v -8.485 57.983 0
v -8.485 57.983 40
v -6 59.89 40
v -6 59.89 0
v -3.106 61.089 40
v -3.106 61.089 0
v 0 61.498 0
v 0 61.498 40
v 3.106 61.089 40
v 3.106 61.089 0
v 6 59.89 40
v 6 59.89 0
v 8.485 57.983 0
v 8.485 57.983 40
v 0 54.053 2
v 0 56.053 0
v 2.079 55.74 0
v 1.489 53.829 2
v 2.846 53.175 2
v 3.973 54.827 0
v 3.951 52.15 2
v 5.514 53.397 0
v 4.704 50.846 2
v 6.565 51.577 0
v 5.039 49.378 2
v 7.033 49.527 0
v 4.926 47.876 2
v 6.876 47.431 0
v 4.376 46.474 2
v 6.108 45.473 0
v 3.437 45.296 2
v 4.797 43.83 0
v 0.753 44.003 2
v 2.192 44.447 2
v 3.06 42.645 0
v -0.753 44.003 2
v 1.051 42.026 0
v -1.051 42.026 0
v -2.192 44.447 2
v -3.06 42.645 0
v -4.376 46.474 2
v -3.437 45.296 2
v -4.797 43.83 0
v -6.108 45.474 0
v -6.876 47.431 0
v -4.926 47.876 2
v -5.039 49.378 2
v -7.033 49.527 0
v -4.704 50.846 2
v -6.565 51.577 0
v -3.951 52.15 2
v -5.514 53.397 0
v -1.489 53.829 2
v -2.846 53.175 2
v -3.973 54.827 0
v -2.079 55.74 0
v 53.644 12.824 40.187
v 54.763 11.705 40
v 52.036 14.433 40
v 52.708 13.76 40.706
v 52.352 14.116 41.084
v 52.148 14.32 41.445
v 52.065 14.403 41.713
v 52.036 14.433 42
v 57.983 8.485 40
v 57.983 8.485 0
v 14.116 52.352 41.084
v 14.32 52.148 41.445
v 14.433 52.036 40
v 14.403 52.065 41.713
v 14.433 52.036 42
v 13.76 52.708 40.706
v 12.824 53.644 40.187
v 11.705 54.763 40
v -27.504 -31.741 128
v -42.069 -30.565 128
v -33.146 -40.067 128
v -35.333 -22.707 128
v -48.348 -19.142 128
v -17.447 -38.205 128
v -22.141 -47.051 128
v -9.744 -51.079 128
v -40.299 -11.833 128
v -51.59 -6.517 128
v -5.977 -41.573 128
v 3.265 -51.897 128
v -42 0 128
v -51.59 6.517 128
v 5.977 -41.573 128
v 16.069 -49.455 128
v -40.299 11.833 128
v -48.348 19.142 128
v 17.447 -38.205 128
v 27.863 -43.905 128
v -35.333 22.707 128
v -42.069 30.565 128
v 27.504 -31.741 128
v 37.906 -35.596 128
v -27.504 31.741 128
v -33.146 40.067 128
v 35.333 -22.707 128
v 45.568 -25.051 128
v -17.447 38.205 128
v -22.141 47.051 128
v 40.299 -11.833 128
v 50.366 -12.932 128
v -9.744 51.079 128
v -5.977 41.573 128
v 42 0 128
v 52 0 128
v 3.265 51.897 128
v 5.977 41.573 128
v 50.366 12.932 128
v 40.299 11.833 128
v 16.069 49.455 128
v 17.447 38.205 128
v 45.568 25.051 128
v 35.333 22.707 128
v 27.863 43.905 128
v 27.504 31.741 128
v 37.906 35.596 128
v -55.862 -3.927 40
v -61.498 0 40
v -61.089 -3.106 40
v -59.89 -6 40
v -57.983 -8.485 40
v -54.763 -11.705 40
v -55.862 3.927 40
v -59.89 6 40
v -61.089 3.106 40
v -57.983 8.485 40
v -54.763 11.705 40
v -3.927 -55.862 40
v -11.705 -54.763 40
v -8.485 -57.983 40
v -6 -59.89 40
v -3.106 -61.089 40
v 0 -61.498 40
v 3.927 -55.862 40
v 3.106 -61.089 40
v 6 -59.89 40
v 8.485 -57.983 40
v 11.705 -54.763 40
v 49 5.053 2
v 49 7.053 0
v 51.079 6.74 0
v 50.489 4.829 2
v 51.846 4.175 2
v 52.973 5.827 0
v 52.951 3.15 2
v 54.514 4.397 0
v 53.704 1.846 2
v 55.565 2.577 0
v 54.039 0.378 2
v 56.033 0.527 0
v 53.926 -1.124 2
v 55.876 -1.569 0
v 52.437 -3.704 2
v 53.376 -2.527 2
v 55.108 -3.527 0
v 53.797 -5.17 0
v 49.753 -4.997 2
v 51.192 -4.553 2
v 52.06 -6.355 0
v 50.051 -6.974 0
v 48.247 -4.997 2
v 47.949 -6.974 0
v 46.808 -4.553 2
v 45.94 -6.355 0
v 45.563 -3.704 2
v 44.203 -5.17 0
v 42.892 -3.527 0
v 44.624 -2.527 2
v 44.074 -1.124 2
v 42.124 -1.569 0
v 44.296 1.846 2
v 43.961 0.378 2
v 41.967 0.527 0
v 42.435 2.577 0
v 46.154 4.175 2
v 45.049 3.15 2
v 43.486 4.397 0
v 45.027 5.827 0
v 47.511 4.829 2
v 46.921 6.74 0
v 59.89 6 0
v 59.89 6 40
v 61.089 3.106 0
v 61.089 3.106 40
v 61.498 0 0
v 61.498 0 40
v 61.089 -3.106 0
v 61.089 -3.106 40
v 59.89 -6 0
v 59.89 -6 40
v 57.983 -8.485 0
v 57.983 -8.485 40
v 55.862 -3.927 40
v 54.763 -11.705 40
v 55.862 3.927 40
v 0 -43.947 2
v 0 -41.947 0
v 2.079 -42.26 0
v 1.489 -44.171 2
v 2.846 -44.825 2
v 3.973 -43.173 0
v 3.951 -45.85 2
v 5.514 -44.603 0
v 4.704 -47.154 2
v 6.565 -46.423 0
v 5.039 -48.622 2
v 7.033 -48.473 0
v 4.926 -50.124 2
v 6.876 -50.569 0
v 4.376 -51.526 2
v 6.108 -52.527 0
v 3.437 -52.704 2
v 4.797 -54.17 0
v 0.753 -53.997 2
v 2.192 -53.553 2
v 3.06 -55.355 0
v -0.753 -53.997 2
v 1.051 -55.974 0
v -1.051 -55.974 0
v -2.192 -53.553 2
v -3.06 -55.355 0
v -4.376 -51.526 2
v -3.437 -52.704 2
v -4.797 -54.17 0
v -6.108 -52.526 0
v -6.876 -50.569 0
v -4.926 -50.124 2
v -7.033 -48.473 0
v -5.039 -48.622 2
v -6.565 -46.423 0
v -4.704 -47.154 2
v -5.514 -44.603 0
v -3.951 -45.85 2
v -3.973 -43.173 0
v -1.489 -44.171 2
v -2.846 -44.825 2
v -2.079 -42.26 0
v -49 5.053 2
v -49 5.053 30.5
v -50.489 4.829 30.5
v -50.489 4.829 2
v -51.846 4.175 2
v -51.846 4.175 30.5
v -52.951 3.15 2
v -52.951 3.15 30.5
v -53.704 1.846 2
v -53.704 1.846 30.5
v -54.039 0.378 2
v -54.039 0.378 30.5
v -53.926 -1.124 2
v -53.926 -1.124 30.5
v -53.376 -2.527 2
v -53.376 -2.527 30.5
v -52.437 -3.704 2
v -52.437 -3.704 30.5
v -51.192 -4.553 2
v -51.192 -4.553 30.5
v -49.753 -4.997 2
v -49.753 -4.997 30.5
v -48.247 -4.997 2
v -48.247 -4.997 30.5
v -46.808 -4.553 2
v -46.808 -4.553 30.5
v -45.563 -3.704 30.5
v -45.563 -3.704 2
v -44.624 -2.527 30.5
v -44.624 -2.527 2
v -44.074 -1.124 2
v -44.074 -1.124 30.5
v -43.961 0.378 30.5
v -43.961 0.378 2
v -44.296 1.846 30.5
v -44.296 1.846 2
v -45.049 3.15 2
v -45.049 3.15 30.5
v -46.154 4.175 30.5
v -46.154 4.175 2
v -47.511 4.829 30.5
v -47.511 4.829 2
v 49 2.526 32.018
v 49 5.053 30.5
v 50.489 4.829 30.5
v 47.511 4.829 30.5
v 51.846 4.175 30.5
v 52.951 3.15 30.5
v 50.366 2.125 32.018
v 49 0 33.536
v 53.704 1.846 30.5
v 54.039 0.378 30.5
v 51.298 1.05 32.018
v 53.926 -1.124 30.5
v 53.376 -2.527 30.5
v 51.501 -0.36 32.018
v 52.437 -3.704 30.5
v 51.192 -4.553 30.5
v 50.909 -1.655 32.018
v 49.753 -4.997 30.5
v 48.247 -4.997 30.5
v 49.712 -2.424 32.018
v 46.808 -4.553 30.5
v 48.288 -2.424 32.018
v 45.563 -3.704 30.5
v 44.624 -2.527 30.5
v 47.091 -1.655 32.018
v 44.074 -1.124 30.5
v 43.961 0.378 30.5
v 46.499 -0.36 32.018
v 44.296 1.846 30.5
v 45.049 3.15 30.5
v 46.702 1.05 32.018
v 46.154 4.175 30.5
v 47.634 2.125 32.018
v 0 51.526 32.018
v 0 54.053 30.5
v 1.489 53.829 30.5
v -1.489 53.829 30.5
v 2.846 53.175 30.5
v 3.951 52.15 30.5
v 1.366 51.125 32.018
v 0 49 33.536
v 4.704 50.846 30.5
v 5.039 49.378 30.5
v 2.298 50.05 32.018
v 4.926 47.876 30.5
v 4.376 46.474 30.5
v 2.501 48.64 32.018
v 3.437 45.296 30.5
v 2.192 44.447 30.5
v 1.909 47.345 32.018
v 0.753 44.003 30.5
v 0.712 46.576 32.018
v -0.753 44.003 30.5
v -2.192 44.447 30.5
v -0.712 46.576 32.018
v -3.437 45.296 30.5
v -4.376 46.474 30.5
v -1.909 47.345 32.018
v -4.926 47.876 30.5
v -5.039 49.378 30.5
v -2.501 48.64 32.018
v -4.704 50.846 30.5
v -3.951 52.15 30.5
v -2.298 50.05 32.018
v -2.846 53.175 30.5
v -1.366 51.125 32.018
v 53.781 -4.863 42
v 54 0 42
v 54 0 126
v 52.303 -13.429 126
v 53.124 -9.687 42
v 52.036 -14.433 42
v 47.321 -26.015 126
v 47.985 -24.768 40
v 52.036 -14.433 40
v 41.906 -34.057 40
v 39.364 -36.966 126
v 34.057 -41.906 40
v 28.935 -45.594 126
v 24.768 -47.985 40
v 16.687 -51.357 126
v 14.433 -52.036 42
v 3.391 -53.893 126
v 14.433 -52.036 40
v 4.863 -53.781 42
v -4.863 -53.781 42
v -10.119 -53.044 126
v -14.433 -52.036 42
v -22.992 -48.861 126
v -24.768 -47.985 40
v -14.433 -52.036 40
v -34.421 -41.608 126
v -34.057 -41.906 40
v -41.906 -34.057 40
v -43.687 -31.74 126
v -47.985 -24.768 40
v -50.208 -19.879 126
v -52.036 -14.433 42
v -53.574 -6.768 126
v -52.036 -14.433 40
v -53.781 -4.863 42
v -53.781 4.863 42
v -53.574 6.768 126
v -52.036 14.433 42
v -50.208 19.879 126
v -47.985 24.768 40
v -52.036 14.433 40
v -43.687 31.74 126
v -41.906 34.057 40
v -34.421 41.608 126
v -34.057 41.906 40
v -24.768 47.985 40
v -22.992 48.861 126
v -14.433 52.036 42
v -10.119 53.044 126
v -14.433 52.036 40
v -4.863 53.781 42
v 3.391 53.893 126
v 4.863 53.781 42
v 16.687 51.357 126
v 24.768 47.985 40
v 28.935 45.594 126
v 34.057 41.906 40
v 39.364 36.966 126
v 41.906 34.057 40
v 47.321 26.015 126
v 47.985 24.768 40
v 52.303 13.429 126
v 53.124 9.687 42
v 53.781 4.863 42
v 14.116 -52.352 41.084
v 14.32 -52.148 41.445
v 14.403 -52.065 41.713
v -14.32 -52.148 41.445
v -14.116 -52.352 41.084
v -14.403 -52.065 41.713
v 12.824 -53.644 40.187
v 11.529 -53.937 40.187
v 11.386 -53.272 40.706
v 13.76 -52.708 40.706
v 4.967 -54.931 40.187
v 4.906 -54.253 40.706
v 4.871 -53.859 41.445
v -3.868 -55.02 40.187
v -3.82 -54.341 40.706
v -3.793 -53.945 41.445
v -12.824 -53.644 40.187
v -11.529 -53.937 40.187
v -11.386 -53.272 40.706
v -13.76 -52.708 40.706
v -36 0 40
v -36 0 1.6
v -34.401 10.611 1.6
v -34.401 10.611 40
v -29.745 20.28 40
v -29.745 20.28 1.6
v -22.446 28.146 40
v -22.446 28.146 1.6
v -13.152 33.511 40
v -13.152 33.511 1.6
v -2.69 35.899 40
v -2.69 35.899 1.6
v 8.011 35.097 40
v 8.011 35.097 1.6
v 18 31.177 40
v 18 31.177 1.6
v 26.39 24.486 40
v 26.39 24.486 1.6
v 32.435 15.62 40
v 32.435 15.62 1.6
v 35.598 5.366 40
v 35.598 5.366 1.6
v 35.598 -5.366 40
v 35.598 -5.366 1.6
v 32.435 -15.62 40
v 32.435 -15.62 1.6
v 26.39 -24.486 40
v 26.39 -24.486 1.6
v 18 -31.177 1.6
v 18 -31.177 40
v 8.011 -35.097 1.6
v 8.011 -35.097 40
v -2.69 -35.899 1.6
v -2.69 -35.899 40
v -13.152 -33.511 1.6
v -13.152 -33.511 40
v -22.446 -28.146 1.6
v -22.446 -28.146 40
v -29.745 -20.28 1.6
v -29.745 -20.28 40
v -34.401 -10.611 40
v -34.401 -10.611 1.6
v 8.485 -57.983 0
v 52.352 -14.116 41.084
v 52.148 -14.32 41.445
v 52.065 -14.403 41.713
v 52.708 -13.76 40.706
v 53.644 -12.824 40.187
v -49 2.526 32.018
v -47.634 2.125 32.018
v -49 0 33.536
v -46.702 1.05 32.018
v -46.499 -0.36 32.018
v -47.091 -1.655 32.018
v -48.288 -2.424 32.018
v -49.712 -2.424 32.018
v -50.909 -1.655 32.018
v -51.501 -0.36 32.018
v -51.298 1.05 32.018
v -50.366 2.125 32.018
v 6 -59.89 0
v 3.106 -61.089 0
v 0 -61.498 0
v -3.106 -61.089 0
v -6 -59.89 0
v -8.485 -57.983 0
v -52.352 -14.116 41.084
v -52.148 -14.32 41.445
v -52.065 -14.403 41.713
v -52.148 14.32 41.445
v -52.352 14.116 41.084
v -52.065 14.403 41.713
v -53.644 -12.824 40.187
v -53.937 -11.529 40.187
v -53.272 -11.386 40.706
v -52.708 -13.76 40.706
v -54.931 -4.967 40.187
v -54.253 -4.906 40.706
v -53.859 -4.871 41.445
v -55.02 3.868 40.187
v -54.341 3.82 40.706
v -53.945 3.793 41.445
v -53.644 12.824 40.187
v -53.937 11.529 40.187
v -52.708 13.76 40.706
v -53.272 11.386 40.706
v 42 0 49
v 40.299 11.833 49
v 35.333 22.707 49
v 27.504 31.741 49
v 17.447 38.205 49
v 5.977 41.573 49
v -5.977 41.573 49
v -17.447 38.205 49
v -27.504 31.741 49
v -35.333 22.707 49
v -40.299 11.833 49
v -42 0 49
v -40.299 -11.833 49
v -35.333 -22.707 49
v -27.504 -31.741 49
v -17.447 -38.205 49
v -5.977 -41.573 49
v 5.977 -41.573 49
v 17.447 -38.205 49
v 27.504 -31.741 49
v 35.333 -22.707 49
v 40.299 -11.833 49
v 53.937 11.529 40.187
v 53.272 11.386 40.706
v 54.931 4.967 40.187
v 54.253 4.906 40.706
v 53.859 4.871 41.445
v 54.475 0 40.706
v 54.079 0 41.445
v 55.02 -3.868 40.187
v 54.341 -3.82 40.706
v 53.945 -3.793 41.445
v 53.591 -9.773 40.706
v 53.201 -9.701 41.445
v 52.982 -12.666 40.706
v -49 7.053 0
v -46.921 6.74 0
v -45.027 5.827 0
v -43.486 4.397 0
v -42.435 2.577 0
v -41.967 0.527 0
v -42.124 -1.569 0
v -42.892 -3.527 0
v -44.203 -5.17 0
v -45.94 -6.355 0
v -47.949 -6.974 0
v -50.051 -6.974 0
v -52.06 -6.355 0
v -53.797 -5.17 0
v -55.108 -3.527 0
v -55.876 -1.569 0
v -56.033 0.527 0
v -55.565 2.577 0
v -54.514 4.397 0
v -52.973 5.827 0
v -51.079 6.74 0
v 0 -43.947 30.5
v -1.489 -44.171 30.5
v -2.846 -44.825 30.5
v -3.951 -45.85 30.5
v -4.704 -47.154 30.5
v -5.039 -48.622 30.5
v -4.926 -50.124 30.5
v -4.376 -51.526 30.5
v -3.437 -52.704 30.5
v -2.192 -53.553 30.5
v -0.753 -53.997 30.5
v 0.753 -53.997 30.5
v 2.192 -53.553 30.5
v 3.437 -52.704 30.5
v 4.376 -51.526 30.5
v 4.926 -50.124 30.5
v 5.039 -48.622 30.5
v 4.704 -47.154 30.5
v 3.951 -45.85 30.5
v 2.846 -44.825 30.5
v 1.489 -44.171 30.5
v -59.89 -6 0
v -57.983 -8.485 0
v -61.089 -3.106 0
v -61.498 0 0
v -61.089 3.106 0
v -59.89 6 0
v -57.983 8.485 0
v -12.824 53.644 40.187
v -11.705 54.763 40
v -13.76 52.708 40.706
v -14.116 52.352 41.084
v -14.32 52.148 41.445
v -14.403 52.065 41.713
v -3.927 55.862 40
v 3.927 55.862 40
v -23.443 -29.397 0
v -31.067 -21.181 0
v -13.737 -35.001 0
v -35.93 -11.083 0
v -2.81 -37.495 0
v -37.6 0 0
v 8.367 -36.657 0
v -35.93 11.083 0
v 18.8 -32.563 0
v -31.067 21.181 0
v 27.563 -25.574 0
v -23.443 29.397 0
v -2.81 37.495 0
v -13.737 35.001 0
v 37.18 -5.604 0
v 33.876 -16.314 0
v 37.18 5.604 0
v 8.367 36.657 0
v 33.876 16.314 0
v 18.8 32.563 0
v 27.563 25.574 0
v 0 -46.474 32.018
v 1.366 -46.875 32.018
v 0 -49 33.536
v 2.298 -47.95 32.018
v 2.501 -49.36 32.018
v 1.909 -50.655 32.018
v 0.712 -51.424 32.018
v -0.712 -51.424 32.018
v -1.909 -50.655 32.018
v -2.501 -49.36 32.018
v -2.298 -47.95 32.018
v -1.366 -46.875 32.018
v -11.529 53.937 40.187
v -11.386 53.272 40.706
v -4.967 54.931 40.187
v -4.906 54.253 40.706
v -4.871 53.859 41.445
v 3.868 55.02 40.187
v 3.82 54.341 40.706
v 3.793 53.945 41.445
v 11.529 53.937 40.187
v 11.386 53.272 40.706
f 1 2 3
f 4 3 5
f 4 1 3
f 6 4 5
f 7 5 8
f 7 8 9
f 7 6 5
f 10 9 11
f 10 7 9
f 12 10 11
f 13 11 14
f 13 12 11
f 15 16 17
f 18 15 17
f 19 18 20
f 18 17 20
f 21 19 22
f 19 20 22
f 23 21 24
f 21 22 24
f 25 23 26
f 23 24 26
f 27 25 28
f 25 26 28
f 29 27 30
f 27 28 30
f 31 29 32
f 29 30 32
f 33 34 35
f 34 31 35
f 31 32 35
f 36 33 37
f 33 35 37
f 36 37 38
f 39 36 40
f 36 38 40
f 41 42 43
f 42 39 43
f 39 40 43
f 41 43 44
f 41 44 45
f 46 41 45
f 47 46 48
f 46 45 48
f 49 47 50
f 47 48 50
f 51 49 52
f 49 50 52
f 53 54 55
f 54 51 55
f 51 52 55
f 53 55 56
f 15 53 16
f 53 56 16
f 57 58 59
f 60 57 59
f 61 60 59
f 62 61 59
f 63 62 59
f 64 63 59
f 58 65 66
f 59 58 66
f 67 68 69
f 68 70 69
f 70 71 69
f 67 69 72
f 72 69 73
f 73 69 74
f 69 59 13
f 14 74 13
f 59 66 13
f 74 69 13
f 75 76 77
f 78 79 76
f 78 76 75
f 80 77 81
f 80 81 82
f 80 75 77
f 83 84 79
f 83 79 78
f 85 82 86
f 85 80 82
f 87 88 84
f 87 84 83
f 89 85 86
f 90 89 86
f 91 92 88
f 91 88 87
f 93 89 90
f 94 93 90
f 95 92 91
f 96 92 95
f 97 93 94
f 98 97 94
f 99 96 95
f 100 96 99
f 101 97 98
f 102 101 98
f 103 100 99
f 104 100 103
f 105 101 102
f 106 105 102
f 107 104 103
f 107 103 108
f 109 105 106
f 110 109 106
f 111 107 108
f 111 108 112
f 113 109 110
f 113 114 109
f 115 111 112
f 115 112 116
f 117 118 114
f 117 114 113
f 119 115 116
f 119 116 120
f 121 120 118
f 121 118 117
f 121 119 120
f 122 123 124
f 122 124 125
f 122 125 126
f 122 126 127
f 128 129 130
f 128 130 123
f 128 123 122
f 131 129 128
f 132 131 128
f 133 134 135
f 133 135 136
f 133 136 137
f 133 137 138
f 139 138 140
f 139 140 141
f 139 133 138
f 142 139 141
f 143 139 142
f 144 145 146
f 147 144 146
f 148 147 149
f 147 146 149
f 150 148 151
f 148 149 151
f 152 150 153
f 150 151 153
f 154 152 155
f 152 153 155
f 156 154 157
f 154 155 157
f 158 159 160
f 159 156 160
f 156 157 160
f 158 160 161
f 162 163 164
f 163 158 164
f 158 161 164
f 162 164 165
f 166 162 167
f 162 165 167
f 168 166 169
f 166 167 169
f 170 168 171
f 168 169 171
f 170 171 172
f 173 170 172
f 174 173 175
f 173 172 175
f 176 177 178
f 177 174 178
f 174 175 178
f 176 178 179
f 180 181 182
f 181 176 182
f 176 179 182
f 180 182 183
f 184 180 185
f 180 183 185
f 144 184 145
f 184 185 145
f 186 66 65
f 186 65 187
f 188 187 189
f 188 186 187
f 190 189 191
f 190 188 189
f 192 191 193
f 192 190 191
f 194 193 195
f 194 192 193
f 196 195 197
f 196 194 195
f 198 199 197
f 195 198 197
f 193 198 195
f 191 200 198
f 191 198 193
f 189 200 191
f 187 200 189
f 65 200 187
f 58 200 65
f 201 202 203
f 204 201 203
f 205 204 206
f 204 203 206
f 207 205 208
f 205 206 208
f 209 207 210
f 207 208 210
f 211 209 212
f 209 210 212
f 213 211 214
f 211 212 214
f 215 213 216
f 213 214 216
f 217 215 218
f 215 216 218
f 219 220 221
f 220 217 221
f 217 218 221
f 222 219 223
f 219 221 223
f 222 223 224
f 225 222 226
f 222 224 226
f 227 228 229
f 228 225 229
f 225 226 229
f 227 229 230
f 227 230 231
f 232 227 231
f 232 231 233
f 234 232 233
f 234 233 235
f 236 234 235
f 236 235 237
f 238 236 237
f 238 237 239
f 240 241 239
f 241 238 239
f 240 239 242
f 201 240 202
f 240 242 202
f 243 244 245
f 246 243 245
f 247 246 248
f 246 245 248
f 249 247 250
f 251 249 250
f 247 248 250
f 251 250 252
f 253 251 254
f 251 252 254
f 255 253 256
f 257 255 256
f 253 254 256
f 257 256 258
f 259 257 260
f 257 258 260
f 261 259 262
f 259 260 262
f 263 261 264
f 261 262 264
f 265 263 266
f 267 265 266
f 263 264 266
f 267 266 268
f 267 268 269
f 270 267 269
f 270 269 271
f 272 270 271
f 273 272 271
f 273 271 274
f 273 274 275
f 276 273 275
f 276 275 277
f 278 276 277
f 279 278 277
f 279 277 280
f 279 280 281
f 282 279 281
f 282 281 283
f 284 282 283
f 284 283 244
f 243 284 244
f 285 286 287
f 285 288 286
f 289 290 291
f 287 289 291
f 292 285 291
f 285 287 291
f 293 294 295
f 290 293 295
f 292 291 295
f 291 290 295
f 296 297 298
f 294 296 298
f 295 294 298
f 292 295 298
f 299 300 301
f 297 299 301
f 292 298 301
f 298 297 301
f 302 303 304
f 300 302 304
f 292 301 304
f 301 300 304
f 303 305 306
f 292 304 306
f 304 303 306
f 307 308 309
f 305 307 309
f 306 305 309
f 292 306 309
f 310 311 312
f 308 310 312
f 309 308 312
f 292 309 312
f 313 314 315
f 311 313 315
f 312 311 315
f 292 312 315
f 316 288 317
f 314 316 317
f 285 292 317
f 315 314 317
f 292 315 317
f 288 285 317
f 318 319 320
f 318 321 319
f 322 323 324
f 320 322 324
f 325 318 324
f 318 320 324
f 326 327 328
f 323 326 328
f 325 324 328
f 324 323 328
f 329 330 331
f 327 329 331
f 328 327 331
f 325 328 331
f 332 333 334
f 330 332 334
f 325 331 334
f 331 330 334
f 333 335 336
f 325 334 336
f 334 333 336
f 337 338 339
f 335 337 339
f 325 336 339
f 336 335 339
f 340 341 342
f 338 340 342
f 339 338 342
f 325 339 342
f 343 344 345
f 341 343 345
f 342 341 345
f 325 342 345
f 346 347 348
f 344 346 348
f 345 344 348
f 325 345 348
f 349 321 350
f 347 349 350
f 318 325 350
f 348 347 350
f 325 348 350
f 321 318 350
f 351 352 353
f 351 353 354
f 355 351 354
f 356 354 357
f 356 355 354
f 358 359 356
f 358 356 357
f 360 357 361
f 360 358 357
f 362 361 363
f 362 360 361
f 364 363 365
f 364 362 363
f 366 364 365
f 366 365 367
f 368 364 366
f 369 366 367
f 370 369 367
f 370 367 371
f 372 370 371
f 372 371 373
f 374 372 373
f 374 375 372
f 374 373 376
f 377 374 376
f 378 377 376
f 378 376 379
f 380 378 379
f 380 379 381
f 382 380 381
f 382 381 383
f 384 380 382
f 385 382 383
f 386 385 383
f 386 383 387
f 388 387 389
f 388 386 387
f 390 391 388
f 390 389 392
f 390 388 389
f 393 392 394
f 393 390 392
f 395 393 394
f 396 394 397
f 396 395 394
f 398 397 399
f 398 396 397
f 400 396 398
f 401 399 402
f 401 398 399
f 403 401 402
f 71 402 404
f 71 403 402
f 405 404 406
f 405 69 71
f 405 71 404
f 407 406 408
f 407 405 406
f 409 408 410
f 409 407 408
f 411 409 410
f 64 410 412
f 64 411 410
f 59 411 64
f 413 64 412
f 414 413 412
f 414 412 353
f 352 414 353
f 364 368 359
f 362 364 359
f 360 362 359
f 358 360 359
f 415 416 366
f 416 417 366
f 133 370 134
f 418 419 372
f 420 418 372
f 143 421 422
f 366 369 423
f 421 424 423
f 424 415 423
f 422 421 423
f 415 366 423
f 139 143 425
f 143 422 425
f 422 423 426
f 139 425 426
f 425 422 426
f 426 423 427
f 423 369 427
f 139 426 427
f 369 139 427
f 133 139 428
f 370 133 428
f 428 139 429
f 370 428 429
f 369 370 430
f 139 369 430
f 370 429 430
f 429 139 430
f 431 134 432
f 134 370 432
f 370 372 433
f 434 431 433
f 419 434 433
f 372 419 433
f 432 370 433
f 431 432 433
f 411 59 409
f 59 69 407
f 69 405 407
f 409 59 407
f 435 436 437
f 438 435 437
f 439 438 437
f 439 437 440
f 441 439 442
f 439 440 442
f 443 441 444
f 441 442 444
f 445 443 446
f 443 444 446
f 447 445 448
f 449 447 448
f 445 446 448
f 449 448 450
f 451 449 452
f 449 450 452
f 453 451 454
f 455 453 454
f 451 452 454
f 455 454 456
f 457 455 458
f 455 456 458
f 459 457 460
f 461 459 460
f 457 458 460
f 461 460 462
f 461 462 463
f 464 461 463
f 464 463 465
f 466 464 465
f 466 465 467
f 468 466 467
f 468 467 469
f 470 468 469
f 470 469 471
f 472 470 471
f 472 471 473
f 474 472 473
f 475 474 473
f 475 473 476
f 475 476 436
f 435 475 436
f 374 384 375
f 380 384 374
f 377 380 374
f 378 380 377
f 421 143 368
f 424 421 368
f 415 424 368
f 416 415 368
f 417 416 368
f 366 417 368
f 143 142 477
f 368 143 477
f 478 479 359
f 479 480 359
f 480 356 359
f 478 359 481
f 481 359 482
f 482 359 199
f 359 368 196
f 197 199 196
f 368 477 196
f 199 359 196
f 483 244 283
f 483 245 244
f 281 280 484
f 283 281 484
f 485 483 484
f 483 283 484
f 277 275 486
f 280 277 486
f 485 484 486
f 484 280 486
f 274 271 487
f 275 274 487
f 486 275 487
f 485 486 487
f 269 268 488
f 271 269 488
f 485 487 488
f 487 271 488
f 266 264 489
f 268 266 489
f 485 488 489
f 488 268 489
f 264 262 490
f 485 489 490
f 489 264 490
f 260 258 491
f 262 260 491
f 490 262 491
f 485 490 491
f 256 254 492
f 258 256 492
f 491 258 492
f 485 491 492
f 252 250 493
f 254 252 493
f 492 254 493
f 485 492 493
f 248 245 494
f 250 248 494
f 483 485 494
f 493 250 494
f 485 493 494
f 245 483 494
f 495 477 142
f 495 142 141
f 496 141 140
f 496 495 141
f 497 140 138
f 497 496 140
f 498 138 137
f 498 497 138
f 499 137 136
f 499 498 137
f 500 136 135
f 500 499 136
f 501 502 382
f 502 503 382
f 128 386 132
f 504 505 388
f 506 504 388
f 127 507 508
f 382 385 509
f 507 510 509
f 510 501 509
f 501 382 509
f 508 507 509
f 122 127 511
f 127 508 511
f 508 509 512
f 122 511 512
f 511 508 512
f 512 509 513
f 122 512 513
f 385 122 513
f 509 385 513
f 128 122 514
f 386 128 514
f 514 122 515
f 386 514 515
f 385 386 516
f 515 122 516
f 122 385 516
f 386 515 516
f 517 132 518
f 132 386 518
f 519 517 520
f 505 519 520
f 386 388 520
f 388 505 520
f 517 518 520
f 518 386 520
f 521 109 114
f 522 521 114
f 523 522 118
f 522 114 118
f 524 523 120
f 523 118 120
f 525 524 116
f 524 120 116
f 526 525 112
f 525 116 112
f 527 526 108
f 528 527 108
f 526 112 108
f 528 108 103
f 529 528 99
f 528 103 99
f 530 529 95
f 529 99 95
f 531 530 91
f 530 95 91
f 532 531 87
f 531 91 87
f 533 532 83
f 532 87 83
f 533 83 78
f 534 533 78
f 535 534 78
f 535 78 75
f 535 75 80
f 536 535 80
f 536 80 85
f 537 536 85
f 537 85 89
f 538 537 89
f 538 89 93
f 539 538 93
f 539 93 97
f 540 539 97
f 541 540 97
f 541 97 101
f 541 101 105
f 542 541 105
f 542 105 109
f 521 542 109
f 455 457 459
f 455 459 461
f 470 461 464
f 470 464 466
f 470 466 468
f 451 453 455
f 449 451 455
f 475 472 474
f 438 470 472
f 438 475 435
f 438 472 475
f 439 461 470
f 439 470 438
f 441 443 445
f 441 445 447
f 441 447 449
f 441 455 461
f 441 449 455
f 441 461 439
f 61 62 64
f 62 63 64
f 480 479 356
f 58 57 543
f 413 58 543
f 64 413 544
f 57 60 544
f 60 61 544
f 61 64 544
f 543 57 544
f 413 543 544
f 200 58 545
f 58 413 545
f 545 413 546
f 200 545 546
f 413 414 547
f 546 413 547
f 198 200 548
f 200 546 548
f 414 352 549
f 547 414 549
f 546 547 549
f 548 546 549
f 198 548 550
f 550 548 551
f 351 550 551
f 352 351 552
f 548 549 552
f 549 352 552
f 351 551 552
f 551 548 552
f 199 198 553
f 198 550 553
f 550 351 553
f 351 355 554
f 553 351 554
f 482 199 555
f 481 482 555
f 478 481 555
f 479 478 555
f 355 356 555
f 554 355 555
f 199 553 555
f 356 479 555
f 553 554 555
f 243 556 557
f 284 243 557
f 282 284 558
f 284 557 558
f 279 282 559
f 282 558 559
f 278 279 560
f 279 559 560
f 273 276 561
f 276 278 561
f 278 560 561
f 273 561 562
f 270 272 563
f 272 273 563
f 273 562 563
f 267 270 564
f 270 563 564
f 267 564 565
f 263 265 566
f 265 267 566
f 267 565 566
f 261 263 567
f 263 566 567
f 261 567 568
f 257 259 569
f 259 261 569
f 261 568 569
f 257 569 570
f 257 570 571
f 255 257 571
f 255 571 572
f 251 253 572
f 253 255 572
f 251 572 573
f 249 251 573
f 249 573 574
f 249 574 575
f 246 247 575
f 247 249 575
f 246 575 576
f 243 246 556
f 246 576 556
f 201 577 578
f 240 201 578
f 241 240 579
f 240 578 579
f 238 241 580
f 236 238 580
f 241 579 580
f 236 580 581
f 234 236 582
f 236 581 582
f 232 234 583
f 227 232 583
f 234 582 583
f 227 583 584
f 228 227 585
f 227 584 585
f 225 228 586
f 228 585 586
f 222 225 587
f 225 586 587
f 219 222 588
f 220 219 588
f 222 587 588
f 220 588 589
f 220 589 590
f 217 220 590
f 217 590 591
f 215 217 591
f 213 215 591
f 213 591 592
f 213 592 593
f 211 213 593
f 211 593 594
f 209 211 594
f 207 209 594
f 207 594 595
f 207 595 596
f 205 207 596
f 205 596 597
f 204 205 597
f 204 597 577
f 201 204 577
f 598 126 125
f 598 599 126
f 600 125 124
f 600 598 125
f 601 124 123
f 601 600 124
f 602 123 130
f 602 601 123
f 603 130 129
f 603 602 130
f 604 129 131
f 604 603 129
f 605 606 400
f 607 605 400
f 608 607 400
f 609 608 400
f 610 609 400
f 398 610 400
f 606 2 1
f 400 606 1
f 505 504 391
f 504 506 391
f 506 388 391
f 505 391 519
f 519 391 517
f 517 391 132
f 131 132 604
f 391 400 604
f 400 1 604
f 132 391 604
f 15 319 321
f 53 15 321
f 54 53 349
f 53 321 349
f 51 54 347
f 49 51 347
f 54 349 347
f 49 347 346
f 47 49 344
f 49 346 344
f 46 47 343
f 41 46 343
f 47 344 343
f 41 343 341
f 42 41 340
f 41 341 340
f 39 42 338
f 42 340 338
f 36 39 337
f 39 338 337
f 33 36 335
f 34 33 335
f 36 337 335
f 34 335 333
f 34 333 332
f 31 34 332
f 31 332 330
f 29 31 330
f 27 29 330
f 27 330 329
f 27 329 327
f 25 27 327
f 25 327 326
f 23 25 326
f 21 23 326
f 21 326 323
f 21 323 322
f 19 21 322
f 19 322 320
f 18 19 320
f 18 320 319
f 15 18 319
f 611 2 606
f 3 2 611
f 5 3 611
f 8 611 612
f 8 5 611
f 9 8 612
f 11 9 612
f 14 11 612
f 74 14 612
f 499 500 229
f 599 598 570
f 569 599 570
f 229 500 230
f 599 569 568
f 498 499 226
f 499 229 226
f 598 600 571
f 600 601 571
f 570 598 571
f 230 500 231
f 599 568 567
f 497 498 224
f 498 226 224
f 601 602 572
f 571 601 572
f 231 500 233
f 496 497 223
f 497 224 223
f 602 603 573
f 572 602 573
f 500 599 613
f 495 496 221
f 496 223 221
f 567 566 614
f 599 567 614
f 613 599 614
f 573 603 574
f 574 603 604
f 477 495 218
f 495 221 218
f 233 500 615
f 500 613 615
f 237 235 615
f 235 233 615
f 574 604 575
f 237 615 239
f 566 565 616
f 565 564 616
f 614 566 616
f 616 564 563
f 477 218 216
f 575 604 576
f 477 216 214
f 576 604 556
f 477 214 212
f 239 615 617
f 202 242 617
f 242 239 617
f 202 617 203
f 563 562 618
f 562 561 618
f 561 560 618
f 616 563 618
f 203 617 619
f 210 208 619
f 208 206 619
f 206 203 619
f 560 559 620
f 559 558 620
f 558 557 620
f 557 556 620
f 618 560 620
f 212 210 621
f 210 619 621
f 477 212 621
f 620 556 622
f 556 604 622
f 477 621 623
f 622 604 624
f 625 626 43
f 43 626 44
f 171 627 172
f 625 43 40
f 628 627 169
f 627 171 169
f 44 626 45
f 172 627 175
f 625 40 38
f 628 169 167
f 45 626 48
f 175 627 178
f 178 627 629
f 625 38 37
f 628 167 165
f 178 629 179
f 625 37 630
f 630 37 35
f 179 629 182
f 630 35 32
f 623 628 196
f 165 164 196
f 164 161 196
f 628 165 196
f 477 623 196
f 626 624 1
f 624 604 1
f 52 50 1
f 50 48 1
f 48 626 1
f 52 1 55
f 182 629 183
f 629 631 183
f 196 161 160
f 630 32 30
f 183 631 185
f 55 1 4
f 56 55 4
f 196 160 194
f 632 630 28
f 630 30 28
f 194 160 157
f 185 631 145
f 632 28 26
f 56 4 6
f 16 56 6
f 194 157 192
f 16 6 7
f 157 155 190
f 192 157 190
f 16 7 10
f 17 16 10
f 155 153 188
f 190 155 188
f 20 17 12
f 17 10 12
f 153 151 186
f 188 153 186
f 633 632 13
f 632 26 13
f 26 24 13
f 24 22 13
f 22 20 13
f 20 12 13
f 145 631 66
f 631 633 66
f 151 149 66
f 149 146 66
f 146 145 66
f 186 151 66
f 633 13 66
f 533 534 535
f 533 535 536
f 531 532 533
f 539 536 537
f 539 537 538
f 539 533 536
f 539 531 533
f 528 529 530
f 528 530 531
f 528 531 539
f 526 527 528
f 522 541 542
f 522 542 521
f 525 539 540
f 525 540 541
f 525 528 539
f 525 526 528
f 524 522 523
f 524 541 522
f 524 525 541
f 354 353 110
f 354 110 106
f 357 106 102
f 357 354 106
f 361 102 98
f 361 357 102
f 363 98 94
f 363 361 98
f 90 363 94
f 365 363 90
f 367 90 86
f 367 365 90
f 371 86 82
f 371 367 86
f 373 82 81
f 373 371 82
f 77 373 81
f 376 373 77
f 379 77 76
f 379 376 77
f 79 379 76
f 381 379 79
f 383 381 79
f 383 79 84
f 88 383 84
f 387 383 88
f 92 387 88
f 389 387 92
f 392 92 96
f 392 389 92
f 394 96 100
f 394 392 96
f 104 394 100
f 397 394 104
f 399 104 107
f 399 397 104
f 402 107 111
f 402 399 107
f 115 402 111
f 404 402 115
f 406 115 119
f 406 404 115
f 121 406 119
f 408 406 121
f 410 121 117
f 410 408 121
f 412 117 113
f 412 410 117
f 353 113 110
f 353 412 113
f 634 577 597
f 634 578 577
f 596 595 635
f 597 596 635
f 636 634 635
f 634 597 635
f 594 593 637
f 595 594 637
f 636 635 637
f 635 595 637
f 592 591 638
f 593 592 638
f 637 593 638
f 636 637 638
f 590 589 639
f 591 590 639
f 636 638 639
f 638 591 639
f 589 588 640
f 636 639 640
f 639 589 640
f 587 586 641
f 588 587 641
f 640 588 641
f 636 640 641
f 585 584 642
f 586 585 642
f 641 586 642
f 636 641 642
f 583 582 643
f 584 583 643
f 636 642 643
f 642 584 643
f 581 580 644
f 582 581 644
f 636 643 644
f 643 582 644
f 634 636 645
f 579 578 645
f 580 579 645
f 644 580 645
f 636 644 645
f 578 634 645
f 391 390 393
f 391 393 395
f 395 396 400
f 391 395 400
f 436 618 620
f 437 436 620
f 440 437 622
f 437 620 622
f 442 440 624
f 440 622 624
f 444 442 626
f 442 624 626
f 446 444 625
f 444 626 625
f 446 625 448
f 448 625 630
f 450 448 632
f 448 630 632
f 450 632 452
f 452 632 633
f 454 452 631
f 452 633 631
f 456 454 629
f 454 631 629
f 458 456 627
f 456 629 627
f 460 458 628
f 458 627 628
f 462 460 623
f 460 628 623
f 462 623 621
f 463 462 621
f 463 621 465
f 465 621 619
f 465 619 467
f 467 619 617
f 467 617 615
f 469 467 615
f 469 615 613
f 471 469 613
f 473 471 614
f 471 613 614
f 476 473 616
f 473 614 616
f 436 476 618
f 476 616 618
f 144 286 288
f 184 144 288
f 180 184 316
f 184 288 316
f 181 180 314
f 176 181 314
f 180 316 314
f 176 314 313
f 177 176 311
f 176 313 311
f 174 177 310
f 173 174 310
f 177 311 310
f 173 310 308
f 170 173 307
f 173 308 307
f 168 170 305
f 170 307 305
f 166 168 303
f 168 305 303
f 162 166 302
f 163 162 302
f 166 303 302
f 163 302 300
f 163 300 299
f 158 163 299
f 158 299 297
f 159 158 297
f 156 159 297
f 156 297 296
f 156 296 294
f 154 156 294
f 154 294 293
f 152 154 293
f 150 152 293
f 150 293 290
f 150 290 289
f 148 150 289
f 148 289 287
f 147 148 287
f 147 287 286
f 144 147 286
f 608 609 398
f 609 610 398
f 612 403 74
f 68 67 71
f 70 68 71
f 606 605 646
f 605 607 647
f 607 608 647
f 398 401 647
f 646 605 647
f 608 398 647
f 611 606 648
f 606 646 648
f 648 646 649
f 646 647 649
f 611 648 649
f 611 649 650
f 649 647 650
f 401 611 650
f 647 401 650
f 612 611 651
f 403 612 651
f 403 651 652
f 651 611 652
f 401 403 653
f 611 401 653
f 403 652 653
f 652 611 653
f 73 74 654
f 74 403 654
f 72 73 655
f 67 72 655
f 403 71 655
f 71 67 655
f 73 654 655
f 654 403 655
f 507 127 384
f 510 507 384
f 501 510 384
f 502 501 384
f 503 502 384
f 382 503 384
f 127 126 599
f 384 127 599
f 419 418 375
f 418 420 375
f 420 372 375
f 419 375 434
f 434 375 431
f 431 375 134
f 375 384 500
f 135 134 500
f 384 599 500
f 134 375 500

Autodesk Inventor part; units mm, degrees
ref_plane "YZ Plane" through (0, 0, 0) normal (1, 0, 0) x (0, 1, 0)
ref_plane "XZ Plane" through (0, 0, 0) normal (0, 1, 0) x (-1, 0, 0)
ref_plane "XY Plane" through (0, 0, 0) normal (0, 0, 1) x (1, 0, 0)
sketch "Эскиз1" plane through (0, 0, 0) normal (0, 0, 1) x (1, 0, 0)
  line L0 (-8.4853, 57.9828) -> (-57.9828, 8.4853)
  line L1 (-57.9828, -8.4853) -> (-8.4853, -57.9828)
  line L2 (8.4853, -57.9828) -> (57.9828, -8.4853)
  line L3 (57.9828, 8.4853) -> (8.4853, 57.9828)
  line L4 (-93.0553, 0) -> (93.0553, 0) projected
  line L5 (0, -87.0906) -> (0, 92.0611) projected
  arc A0 (-57.9828, 8.4853) -> (-57.9828, -8.4853) centre (-49.4975, 0) ccw
  arc A1 (8.4853, 57.9828) -> (-8.4853, 57.9828) centre (0, 49.4975) ccw
  arc A2 (57.9828, -8.4853) -> (57.9828, 8.4853) centre (49.4975, 0) ccw
  arc A3 (-8.4853, -57.9828) -> (8.4853, -57.9828) centre (0, -49.4975) ccw
  point P0 (0, 66.468)
  point P1 (-66.468, 0)
  point P2 (66.468, 0)
  dimension "d5" = 94
  dimension "d7" = 94
  dimension "d8" = 12
extrude "Выдавливание1" add sketch "Эскиз1" along normal blind 40
sketch "Эскиз2" plane through (0, 0, 40) normal (0, 0, 1) x (1, 0, 0)
  circle A0 centre (0, 0) radius 54
  dimension "d11" = 108
extrude "Выдавливание2" add sketch "Эскиз2" along normal blind 88
sketch "Эскиз3" plane through (0, 0, 128) normal (0, 0, 1) x (1, 0, 0)
  circle A0 centre (0, 0) radius 42
  dimension "d14" = 84
extrude "Выдавливание3" cut sketch "Эскиз3" against normal blind 79
sketch "Эскиз4" plane through (0, 0, 0) normal (0, 0, -1) x (-1, 0, 0)
  circle A0 centre (0, 0) radius 36
  dimension "d17" = 72
extrude "Выдавливание4" cut sketch "Эскиз4" against normal blind 40
chamfer "Фаска1" distance 2 angle 45 1 edges at (-54, 0, 128)
chamfer "Фаска2" distance 1.6 angle 45 1 edges at (36, 0, 0)
sketch "Эскиз6" plane through (0, 0, 0) normal (0, 0, -1) x (-1, 0, 0)
  circle A0 centre (0, 49) radius 6
  circle A1 centre (0, -49) radius 6
  line L0 (86.0965, 0) -> (-86.0965, 0) projected
  circle A2 centre (49, 0) radius 6
  circle A3 centre (-49, 0) radius 6
  line L1 (0, -86.0965) -> (0, 86.0965) projected
  point P0 (0, 0)
  dimension "d30" = 98
  dimension "d31" = 12
  dimension "d32" = 12
  dimension "d33" = 98
  dimension "d34" = 12
  dimension "d35" = 12
fillet "Сопряжение1" radius 2 5 edges at (0, 54, 40) (-54, 0, 40) (0, -54, 40) (53.5066, -7.2827, 40) (53.5066, 7.2827, 40)
hole "Отверстие1" at (49, 0, 0) direction (0, 0, 1) diameter 10.106 depth 30.5 tip angle 118 thread size "M12x1.75" class "6H" standard "ANSI Metric M Profile"
chamfer "Фаска3" distance 2 angle 45 1 edges at (49, -5.053, 0)
sketch "Эскиз7" plane through (0, 0, 0) normal (0, 0, -1) x (-1, 0, 0)
  circle A0 centre (49, 0) radius 6
  point P0 (0, 0)
  dimension "d47" = 49
  dimension "d48" = 12
hole "Отверстие2" at (-49, 0, 0) direction (0, 0, 1) diameter 10.106 depth 30.5 tip angle 118 thread size "M12x1.75" class "6H" standard "ANSI Metric M Profile"
chamfer "Фаска4" distance 2 angle 45 1 edges at (-49, -5.053, 0)
sketch "Эскиз8" plane through (0, 0, 0) normal (0, 0, -1) x (-1, 0, 0)
  circle A0 centre (0, 49) radius 6
  point P0 (0, 0)
  dimension "d59" = 12
  dimension "d60" = 49
hole "Отверстие3" at (0, 49, 0) direction (0, 0, 1) diameter 10.106 depth 30.5 tip angle 118 thread size "M12x1.75" class "6H" standard "ANSI Metric M Profile"
chamfer "Фаска5" distance 2 angle 45 1 edges at (0, 43.947, 0)
sketch "Эскиз9" plane through (0, 0, 0) normal (0, 0, -1) x (-1, 0, 0)
  circle A0 centre (0, -49) radius 6
  point P0 (0, 0)
  dimension "d71" = 12
  dimension "d72" = 49
hole "Отверстие4" at (0, -49, 0) direction (0, 0, 1) diameter 10.106 depth 30.5 tip angle 118 thread size "M12x1.75" class "6H" standard "ANSI Metric M Profile"
chamfer "Фаска6" distance 2 angle 45 1 edges at (0, -54.053, 0)
properties part number "Пункт 1(чё там считать)"
